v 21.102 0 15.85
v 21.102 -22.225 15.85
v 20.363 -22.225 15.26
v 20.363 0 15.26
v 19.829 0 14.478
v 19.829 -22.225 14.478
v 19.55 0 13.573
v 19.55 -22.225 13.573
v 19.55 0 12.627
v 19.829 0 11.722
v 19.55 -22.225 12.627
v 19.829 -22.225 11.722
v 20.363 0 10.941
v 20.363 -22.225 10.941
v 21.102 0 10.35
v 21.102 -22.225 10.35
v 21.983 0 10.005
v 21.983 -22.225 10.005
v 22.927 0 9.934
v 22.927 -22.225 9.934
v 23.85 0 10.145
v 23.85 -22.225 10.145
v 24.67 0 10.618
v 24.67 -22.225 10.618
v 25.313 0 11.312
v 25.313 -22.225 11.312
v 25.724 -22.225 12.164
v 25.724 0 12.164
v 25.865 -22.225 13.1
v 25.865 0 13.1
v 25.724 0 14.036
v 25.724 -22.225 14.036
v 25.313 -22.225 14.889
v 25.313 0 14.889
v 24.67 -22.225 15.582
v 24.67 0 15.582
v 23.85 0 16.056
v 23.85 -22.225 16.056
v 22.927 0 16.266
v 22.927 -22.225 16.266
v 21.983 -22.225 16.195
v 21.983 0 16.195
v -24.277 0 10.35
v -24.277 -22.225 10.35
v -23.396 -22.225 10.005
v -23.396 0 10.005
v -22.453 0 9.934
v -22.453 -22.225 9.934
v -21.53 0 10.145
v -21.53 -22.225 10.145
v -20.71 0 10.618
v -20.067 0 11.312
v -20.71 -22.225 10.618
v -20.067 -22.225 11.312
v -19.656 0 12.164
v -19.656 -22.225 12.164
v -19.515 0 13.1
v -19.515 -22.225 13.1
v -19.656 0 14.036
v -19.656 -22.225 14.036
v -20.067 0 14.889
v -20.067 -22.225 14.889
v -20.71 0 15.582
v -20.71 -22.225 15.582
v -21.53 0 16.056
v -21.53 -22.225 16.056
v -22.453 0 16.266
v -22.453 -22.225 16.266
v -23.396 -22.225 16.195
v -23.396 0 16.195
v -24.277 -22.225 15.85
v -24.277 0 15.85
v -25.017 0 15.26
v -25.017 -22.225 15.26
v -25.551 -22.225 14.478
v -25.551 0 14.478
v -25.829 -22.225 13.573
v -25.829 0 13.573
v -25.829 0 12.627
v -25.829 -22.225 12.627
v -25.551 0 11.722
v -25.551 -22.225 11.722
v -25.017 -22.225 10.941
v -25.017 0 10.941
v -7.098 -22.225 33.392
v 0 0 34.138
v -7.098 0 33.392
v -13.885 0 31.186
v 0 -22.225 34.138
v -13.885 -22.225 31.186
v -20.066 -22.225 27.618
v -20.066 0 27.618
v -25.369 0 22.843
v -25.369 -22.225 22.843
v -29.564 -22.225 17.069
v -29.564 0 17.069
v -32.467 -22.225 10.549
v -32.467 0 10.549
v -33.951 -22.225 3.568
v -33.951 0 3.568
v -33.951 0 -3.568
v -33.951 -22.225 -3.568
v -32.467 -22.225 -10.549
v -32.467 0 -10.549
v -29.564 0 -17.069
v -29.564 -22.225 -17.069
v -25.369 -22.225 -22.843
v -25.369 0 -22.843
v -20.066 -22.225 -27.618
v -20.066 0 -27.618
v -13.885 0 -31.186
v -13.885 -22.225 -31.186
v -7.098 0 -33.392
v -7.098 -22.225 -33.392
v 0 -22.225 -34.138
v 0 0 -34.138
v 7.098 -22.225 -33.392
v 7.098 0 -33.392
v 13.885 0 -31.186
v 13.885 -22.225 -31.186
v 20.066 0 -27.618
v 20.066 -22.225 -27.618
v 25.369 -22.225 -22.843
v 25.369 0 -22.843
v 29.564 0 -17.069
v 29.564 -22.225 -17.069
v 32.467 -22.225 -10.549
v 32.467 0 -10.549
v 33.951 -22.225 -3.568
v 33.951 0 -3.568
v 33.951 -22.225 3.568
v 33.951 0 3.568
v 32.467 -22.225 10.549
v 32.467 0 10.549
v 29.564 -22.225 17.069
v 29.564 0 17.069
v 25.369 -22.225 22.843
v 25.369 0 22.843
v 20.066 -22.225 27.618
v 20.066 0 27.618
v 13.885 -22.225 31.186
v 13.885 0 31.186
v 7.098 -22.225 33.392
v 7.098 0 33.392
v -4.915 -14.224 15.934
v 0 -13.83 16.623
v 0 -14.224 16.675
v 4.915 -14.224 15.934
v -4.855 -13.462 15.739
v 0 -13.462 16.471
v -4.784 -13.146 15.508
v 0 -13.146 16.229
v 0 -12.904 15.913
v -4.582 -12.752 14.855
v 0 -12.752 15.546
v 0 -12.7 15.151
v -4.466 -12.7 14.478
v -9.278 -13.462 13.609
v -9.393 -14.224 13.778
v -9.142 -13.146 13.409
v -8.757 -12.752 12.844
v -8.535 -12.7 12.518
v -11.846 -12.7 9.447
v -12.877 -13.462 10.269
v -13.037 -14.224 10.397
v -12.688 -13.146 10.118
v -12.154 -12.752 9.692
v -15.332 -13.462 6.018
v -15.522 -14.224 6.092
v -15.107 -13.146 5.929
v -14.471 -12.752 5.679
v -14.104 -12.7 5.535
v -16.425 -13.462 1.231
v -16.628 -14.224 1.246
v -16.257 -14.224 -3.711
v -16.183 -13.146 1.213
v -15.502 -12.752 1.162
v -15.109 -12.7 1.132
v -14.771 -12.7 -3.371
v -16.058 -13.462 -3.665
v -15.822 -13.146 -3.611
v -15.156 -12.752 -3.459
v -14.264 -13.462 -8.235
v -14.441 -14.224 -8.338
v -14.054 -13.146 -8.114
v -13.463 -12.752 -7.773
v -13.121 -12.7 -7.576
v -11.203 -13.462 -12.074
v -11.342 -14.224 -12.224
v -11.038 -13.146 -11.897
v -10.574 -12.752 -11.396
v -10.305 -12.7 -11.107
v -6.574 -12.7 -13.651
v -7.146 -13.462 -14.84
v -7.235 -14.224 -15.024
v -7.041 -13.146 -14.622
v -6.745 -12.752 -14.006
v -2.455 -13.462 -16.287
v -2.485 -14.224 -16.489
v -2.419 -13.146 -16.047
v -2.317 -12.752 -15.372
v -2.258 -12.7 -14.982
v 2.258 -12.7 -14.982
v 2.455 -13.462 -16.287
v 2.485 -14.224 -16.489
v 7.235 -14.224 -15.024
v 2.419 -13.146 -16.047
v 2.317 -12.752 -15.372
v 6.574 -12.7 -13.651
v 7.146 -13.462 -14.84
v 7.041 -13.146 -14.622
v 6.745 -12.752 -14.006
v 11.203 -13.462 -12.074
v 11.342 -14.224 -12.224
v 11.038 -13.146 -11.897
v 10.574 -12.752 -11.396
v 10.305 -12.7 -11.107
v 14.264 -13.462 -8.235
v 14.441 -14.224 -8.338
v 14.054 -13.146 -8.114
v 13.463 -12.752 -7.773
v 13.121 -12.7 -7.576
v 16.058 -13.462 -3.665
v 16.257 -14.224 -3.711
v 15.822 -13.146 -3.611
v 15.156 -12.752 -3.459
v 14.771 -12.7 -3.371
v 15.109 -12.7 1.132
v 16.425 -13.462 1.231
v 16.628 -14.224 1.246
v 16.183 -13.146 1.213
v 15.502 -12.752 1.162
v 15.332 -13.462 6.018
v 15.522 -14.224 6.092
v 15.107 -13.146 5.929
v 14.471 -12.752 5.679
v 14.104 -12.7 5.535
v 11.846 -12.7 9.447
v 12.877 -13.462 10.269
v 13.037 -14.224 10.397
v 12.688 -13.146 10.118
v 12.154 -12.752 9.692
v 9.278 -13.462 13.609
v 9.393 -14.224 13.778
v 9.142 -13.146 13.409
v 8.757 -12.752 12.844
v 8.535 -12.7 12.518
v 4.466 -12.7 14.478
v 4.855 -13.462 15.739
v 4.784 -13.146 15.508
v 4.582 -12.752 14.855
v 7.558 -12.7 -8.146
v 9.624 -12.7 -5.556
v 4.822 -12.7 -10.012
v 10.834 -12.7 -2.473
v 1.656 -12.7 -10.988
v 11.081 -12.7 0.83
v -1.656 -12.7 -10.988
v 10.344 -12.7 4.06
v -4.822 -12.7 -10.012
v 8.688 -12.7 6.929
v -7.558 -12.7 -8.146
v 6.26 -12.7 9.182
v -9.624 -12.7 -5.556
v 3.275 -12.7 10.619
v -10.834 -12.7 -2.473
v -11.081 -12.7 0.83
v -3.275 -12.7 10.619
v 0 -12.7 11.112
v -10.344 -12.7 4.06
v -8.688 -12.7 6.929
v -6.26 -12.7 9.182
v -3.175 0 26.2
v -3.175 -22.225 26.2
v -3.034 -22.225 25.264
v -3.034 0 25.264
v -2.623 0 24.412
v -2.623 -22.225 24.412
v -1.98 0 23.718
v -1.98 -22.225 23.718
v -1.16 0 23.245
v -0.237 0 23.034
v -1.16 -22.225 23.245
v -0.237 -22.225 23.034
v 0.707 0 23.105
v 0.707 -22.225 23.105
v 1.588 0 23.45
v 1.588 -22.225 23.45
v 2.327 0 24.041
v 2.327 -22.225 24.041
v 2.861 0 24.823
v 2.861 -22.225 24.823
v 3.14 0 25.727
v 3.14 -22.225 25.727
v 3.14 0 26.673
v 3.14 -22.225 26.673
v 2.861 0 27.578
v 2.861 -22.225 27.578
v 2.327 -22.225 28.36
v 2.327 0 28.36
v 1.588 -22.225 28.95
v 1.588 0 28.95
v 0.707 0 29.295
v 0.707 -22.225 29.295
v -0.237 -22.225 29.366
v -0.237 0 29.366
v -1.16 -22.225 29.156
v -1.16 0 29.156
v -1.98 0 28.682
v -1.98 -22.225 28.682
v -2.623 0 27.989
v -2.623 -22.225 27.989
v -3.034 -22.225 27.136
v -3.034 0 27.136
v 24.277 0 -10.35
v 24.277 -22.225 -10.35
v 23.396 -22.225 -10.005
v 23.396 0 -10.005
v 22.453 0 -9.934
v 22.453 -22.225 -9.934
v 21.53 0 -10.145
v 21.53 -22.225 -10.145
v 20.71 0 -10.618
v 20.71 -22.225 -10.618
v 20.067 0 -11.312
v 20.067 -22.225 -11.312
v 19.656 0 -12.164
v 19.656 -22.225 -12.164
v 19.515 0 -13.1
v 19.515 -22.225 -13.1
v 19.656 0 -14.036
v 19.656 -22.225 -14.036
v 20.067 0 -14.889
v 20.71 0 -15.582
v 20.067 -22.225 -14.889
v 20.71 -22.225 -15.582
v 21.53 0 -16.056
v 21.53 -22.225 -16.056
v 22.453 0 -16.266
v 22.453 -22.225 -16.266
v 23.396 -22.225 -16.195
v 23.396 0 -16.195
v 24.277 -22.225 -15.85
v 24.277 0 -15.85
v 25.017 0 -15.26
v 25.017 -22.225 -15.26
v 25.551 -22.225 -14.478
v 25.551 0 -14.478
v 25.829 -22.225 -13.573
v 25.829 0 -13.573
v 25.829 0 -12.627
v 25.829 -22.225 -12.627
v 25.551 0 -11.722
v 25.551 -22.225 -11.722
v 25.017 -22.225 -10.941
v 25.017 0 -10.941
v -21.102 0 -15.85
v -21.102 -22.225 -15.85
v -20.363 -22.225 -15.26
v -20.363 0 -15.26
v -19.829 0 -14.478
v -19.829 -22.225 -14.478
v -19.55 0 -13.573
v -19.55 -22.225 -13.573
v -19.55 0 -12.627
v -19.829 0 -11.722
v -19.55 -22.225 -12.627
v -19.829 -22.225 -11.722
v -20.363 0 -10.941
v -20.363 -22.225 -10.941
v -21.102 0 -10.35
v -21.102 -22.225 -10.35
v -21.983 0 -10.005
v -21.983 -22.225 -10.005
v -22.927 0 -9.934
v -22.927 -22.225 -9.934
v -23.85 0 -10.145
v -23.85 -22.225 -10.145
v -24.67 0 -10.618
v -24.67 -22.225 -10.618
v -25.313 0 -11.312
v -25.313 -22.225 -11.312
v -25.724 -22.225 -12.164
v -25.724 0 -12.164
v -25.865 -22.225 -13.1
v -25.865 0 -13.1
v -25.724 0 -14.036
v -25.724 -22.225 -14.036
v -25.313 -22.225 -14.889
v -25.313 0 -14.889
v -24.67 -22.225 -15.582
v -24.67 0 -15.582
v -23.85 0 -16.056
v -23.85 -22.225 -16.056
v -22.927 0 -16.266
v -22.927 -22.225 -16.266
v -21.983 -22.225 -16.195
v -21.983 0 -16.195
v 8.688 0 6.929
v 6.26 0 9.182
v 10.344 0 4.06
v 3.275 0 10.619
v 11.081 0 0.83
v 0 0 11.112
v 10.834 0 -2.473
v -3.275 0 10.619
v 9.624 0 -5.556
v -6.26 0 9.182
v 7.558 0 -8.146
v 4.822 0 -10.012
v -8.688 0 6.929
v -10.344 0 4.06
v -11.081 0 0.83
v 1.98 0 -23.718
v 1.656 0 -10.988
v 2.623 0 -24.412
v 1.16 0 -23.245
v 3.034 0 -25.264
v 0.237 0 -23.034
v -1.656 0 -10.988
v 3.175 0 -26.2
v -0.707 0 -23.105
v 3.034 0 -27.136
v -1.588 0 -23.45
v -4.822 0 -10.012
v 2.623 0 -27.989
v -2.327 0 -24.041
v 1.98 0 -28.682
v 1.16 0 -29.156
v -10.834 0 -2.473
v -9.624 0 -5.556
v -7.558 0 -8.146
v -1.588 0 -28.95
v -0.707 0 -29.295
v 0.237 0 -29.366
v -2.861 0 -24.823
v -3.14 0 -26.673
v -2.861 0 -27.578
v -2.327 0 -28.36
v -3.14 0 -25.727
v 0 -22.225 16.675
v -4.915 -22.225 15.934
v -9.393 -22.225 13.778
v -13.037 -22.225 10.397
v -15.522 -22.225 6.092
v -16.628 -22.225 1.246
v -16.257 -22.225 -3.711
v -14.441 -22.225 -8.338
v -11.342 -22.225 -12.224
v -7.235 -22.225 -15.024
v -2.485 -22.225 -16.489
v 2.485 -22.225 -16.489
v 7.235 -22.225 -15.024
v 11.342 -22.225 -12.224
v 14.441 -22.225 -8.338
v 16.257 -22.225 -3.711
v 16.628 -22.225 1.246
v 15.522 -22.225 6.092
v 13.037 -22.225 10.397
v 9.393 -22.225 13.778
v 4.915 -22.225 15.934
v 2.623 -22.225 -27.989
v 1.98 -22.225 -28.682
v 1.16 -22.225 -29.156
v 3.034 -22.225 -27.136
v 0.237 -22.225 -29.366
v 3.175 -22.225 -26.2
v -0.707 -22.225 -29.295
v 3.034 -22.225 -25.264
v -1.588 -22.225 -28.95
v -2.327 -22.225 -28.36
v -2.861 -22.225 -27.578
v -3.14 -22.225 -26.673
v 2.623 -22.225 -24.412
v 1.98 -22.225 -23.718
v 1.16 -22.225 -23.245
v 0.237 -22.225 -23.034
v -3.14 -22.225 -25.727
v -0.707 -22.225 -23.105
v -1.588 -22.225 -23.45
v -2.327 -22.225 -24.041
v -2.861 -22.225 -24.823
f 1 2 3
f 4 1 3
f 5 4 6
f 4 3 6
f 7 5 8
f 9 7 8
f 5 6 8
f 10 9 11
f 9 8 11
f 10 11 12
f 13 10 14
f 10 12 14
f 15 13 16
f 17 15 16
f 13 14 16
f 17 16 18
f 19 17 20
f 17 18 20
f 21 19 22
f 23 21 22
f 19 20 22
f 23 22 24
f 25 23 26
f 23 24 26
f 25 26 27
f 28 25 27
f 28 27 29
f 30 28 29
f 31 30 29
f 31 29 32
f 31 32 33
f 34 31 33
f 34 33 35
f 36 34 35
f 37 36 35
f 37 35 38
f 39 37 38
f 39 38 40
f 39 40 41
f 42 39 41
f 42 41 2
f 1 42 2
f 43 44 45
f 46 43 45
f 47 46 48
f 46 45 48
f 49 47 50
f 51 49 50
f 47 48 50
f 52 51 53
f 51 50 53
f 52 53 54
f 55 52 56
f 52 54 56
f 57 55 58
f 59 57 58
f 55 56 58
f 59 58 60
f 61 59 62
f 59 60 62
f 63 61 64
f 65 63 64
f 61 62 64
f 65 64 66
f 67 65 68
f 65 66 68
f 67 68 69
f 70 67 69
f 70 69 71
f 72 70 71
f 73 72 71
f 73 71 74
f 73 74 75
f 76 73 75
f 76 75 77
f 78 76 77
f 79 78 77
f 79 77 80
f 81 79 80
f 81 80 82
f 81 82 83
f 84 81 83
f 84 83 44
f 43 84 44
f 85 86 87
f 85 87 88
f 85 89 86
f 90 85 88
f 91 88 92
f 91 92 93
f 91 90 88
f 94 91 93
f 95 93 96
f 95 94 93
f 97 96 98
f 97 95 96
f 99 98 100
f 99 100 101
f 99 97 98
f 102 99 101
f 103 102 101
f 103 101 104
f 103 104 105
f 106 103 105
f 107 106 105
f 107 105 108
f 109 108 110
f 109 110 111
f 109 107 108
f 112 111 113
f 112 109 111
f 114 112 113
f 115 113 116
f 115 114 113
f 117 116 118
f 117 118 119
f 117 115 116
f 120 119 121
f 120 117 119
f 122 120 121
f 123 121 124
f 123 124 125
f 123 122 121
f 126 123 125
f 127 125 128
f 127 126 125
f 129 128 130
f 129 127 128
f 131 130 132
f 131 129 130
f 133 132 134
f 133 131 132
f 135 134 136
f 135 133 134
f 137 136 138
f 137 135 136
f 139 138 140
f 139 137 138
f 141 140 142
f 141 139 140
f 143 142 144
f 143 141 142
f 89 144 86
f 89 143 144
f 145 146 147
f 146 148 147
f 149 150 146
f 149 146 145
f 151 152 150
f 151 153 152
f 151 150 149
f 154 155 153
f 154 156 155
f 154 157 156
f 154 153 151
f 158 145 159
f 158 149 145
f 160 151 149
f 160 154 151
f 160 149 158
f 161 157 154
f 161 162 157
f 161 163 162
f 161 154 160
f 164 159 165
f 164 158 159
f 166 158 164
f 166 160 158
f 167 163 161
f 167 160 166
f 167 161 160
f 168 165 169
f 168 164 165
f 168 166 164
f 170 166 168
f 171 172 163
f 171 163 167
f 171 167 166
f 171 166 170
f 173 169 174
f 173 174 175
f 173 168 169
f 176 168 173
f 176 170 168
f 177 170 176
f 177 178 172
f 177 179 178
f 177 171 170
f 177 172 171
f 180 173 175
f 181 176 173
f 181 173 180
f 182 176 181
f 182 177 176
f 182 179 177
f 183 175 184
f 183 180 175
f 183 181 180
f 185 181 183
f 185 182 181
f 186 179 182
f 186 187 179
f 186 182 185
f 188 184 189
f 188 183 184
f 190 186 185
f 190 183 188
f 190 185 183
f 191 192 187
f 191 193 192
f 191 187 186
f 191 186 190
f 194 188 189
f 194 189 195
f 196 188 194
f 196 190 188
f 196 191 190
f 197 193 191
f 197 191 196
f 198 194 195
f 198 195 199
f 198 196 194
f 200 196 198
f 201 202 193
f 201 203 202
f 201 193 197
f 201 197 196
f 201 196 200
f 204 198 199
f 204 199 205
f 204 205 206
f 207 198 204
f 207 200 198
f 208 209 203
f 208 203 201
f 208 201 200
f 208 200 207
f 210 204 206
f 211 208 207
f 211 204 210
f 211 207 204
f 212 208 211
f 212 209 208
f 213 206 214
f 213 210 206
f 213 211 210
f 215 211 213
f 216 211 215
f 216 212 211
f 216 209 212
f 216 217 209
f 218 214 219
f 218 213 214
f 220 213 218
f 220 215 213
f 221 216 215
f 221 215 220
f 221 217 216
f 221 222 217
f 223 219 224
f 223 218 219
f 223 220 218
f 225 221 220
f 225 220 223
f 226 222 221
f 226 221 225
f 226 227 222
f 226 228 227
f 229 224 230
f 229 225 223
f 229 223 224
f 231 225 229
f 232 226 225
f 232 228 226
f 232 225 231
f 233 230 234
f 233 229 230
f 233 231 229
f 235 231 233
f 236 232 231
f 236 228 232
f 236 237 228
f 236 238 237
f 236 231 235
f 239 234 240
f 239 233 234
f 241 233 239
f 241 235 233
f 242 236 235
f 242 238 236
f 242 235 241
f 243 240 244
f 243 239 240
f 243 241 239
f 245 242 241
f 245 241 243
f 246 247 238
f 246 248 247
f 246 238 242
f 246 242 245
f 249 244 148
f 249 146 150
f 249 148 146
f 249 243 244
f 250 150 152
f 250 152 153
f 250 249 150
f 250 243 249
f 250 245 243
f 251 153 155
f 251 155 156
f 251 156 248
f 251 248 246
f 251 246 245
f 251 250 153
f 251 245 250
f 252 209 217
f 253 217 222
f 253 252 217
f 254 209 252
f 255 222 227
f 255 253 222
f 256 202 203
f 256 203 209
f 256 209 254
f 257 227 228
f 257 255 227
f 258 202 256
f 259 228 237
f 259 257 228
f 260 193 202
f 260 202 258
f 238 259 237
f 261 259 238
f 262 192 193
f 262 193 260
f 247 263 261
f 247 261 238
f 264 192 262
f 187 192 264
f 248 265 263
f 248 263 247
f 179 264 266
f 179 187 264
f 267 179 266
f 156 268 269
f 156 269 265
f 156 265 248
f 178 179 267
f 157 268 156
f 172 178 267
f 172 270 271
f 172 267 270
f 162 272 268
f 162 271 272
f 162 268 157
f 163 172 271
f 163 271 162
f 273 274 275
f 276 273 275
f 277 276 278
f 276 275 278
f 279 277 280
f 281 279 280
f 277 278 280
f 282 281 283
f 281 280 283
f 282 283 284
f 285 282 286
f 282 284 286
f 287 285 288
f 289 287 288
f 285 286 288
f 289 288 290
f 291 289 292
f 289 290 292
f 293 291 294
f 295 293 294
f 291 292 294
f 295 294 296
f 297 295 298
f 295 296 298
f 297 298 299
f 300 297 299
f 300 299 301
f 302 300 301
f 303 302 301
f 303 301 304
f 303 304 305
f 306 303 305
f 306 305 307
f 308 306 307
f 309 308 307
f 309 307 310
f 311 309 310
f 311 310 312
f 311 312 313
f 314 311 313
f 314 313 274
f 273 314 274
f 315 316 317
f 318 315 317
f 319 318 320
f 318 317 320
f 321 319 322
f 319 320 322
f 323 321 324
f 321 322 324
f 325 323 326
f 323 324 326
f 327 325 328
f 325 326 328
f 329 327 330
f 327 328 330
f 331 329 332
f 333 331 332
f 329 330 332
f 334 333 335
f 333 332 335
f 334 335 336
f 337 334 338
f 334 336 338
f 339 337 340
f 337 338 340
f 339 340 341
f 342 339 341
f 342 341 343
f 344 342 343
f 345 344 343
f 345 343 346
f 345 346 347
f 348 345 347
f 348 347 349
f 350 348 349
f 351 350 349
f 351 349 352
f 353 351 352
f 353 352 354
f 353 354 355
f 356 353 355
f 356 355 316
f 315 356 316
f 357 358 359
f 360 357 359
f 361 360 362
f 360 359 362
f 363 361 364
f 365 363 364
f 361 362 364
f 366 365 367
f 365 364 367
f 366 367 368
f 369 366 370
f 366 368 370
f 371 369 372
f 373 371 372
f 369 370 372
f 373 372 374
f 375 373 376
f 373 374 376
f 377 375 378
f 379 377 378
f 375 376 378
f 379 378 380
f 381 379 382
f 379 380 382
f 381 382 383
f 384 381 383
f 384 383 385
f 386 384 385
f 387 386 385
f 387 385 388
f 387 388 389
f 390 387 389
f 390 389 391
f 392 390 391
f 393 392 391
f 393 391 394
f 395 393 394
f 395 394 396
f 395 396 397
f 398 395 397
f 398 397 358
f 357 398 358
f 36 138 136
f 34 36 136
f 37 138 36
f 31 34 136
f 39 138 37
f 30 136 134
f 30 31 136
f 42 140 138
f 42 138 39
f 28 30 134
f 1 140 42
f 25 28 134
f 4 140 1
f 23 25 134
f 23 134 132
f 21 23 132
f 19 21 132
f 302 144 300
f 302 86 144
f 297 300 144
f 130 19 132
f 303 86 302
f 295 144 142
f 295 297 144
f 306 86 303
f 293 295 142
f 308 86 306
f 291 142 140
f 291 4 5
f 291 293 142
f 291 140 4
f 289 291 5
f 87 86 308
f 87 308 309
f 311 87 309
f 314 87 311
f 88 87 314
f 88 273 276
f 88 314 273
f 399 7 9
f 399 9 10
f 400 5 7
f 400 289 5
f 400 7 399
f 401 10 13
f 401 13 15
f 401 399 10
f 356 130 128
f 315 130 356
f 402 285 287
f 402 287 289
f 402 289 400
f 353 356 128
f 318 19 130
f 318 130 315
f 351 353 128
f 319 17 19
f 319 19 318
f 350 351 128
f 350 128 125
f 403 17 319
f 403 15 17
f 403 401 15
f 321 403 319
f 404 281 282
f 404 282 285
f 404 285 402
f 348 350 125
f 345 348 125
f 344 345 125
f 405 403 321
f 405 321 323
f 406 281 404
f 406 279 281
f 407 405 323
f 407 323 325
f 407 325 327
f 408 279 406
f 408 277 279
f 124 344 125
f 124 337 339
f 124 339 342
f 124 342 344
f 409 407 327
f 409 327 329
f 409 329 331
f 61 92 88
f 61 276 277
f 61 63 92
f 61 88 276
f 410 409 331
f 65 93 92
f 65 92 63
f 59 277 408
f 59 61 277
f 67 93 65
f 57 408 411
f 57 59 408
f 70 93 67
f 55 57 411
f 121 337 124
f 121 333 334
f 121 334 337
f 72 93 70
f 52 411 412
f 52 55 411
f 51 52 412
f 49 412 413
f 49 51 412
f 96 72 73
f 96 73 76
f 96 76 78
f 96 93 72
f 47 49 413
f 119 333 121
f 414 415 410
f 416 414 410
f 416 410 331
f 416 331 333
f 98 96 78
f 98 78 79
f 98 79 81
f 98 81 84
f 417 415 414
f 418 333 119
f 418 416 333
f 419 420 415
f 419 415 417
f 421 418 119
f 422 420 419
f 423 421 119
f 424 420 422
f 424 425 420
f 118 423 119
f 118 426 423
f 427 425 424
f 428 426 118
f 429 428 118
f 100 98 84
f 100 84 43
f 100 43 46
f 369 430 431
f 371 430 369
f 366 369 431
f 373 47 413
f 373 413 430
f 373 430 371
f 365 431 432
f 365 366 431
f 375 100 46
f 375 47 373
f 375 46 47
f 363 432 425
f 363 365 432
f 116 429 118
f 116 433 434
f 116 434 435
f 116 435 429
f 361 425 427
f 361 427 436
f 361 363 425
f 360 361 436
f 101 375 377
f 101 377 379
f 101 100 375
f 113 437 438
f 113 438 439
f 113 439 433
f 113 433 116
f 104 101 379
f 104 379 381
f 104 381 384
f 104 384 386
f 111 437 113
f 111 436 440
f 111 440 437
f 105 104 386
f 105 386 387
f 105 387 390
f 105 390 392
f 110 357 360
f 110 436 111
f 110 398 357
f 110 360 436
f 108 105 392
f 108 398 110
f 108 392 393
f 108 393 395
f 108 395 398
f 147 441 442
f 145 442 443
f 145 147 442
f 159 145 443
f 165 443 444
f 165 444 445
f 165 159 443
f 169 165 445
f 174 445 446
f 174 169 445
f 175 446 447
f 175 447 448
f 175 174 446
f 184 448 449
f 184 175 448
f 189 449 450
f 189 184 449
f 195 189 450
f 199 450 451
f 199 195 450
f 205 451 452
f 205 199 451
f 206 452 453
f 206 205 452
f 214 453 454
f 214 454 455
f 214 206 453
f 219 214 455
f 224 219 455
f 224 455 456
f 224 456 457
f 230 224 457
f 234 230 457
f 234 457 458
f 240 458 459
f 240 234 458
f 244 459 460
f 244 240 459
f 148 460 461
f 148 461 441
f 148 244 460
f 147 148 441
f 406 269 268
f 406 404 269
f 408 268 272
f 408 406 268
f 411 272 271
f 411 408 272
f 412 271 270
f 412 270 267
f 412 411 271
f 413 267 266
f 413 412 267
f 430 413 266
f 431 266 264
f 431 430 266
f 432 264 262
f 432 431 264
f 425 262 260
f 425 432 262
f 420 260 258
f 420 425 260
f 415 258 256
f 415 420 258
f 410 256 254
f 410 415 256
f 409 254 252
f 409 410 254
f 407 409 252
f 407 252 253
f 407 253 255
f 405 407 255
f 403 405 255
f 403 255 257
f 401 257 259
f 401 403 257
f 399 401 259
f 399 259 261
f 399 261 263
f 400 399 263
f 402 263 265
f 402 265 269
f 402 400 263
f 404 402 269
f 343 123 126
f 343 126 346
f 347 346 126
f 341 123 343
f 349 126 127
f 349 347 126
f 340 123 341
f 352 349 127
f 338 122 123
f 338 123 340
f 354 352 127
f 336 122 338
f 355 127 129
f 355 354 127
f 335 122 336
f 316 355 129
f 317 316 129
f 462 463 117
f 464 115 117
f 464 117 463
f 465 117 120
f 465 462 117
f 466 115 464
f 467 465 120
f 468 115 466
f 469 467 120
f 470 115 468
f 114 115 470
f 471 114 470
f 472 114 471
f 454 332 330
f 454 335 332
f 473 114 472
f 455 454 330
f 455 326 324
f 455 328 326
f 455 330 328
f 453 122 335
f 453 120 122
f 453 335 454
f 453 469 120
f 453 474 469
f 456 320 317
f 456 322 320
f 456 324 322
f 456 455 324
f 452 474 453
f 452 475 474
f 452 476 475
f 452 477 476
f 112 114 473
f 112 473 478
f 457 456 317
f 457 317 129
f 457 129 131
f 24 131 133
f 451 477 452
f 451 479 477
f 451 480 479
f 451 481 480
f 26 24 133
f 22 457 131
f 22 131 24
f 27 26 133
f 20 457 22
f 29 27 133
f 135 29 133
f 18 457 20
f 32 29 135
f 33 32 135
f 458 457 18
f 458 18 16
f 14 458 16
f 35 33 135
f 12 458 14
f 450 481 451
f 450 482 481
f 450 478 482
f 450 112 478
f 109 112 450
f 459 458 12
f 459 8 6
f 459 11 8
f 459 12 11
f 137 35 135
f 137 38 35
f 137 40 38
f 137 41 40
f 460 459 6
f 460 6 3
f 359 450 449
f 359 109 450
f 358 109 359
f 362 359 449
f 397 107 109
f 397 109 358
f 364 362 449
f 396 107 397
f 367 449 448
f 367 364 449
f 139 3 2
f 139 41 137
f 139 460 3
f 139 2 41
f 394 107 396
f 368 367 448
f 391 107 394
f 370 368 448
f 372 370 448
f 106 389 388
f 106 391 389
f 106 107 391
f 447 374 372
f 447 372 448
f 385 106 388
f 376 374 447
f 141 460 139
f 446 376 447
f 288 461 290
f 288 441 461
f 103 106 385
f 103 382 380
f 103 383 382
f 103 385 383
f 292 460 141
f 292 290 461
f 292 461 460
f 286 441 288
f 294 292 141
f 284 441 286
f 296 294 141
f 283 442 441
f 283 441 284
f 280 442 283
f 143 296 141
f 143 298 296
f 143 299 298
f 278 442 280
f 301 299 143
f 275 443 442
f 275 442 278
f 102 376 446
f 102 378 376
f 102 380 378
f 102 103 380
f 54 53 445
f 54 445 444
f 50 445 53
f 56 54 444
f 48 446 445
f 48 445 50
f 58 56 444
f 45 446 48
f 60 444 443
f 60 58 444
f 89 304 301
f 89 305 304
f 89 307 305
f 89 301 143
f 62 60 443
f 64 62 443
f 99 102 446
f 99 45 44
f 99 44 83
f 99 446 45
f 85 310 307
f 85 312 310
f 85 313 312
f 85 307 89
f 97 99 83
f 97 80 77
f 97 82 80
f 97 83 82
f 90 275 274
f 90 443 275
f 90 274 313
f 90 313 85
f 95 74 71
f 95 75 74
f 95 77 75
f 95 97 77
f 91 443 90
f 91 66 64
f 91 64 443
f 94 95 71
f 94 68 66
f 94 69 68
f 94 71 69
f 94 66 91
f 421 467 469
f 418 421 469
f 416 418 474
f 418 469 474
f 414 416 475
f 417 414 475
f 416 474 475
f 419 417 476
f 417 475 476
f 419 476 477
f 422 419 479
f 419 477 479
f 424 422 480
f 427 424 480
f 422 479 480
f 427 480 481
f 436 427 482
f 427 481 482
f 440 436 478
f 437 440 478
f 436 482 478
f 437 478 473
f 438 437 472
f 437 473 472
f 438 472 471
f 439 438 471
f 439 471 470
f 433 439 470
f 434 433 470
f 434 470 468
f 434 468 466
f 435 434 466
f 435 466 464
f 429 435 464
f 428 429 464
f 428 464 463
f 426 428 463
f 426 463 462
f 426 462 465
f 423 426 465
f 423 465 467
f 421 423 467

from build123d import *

# Parameters (mm, degrees)
F2_R     = 1.524
F3_R     = 3.175
F4_DEPTH = 22.226
F5_COUNT = 6


with BuildPart() as f1:
    # F0 (on Right) → F1 (revolve)
    with BuildSketch(Plane.YZ):
        Polygon((-12.7, 11.1125), (0, 11.1125), (0, 34.1376), (-22.225, 34.1376), (-22.225, 16.6751), (-12.7, 16.6751), align=None)
    revolve(axis=Axis((0, -9.273836258, 0), (0, -1, 0)))

    # F2
    f2_edges = [f1.edges().sort_by_distance(p)[0] for p in [
        (0, -12.7, -16.6751),
    ]]
    fillet(f2_edges, radius=F2_R)

    # F3 (on face) → F4 (cut, through all)
    with BuildSketch(Plane.XZ.offset(22.225)):
        with Locations((0, -26.2001)):
            Circle(F3_R)
    f4 = extrude(amount=-F4_DEPTH, mode=Mode.SUBTRACT)

    # F5: F4 ×6 about axis
    f5_axis = Axis((0, -22.225, 0), (0, -1, 0))
    for i in range(1, F5_COUNT):
        add(f4.rotate(f5_axis, i * 360 / F5_COUNT), mode=Mode.SUBTRACT)


solid = f1.part
